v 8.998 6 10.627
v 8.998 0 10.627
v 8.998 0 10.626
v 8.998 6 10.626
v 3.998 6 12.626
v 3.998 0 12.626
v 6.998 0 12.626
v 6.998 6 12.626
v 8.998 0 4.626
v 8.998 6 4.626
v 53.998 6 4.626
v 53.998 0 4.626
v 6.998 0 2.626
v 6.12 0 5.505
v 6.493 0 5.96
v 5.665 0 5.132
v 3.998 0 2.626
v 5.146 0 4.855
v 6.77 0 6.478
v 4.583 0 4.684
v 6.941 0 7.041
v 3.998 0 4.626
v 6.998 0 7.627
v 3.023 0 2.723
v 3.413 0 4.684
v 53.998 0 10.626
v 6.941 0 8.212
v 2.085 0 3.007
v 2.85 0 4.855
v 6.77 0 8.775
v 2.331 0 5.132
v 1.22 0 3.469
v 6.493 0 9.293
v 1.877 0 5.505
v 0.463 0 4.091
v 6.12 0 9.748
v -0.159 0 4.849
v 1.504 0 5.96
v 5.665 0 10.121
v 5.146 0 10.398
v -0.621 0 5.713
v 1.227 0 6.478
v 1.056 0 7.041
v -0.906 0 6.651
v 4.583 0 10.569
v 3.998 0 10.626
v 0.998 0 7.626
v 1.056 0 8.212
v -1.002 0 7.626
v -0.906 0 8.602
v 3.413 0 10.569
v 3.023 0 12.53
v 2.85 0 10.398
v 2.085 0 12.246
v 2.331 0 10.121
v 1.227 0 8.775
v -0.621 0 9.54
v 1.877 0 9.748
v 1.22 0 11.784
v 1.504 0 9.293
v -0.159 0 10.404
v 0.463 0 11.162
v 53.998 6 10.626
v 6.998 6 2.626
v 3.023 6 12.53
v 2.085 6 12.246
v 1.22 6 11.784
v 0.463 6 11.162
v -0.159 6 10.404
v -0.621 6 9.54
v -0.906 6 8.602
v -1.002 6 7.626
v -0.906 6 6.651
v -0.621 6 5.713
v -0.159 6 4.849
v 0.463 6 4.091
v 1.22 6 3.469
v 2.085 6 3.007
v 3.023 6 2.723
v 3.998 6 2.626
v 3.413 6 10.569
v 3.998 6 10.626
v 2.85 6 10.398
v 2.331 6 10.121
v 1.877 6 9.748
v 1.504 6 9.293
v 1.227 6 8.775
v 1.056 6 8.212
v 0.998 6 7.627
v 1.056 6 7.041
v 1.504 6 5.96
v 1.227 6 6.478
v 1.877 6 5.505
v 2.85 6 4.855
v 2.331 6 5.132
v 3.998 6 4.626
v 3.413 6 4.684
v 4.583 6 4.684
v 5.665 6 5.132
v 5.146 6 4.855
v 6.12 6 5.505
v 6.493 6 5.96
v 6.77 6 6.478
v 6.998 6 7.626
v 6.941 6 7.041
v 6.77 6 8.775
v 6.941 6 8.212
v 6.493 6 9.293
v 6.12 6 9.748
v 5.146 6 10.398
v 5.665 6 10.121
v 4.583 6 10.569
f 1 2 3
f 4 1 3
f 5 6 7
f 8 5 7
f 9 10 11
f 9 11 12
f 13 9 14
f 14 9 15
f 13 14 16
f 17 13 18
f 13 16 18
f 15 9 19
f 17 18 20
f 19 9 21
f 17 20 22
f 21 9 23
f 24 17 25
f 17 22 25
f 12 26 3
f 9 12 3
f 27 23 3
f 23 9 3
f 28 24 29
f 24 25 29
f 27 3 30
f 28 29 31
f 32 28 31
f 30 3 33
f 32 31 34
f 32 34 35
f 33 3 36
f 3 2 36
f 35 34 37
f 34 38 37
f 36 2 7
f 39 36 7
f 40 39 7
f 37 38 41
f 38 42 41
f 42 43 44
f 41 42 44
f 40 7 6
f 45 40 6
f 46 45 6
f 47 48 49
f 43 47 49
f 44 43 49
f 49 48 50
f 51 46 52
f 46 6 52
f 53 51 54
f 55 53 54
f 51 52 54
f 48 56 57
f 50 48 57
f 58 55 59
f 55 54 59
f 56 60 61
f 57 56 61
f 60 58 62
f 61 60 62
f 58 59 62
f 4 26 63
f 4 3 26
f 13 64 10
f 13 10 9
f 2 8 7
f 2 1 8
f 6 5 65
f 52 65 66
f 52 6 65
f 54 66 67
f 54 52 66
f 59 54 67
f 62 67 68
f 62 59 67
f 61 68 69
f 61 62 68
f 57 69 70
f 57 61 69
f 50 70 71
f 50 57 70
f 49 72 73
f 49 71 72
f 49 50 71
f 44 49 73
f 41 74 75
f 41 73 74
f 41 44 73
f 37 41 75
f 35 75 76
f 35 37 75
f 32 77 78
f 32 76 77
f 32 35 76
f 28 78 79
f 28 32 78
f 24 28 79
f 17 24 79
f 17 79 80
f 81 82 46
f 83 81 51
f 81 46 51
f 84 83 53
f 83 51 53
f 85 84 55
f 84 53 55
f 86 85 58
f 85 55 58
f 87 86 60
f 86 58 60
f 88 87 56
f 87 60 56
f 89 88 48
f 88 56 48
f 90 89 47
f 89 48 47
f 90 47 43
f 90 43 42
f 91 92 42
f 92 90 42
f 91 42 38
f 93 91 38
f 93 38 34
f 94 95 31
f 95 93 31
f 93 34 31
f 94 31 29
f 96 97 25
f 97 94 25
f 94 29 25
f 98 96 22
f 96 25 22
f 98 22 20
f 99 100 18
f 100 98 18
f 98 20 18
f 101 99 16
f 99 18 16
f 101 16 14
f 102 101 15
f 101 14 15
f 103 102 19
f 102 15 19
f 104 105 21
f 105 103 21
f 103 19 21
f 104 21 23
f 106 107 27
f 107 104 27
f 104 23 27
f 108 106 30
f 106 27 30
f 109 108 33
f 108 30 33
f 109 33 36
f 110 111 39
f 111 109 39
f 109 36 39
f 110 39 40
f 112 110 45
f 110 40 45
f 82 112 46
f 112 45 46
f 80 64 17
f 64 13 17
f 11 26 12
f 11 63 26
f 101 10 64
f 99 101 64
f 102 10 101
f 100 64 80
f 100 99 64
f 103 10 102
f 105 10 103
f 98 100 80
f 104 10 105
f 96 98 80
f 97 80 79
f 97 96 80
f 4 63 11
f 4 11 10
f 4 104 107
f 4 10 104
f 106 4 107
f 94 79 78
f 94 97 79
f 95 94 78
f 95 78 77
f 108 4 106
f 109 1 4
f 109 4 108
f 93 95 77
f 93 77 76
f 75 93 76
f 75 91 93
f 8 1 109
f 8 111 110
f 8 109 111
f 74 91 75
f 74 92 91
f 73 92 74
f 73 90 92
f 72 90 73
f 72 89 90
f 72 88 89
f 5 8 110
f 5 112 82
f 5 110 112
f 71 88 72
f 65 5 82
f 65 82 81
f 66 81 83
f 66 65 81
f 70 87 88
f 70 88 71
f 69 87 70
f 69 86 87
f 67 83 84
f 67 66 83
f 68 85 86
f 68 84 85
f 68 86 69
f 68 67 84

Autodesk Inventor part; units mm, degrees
ref_plane "YZ Plane" through (0, 0, 0) normal (1, 0, 0) x (0, 1, 0)
ref_plane "XZ Plane" through (0, 0, 0) normal (0, 1, 0) x (-1, 0, 0)
ref_plane "XY Plane" through (0, 0, 0) normal (0, 0, 1) x (1, 0, 0)
sketch "Sketch1" plane through (0, 0, 0) normal (0, 1, 0) x (-1, 0, 0)
  circle A0 centre (-3.9982, 7.6265) radius 3
  circle A1 centre (-3.9982, 7.6265) radius 5
  line L0 (-3.9982, 12.6265) -> (-8.9982, 12.6265)
  line L1 (-8.9982, 12.6265) -> (-8.9982, 2.6265)
  line L2 (-8.9982, 2.6265) -> (-3.9982, 2.6265)
  line L3 (-3.9982, 2.6265) -> (-3.9982, 12.6265)
  point P0 (0, 0)
  dimension "d0" = 6
  dimension "d1" = 2
  dimension "d8" = 0
extrude "Extrusion1" add sketch "Sketch1" along normal blind 6 contours A0 L3 A1 | A0 L3 A1
extrude "Extrusion2" add sketch "Sketch1" along normal blind 6 contours L3 A0 | A0 L3 A1 | A1 L1 L0 | L2 L1 A1 picked at (-5.8933, 7.7284) picked at (-4.3691, 3.335)
extrude "Extrusion3" cut sketch "Sketch1" along normal blind 6 contours A0 L3 | L3 A0
sketch "Sketch2" plane through (8.9982, 0, 12.6265) normal (1, 0, 0) x (0, 0, -1)
  line L0 (0, 0) -> (10, 0) projected
  line L1 (2, 6) -> (8, 6)
  line L2 (8, 6) -> (8, 0)
  line L3 (8, 0) -> (2, 0)
  line L4 (2, 0) -> (2, 6)
  line L5 (0, 0) -> (0, 6) projected
  line L6 (10, 0) -> (10, 6) projected
  line L7 (0, 6) -> (10, 6) projected
  point P0 (12.6265, 0)
  dimension "d9" = 2
  dimension "d10" = 2
extrude "Extrusion4" add sketch "Sketch2" along normal blind 45 contours L4 L1 L2 L0
chamfer "Chamfer1" distance 2 angle 45 2 edges at (8.9982, 3, 12.6265) (8.9982, 3, 2.6265)
properties part number "roka1"
